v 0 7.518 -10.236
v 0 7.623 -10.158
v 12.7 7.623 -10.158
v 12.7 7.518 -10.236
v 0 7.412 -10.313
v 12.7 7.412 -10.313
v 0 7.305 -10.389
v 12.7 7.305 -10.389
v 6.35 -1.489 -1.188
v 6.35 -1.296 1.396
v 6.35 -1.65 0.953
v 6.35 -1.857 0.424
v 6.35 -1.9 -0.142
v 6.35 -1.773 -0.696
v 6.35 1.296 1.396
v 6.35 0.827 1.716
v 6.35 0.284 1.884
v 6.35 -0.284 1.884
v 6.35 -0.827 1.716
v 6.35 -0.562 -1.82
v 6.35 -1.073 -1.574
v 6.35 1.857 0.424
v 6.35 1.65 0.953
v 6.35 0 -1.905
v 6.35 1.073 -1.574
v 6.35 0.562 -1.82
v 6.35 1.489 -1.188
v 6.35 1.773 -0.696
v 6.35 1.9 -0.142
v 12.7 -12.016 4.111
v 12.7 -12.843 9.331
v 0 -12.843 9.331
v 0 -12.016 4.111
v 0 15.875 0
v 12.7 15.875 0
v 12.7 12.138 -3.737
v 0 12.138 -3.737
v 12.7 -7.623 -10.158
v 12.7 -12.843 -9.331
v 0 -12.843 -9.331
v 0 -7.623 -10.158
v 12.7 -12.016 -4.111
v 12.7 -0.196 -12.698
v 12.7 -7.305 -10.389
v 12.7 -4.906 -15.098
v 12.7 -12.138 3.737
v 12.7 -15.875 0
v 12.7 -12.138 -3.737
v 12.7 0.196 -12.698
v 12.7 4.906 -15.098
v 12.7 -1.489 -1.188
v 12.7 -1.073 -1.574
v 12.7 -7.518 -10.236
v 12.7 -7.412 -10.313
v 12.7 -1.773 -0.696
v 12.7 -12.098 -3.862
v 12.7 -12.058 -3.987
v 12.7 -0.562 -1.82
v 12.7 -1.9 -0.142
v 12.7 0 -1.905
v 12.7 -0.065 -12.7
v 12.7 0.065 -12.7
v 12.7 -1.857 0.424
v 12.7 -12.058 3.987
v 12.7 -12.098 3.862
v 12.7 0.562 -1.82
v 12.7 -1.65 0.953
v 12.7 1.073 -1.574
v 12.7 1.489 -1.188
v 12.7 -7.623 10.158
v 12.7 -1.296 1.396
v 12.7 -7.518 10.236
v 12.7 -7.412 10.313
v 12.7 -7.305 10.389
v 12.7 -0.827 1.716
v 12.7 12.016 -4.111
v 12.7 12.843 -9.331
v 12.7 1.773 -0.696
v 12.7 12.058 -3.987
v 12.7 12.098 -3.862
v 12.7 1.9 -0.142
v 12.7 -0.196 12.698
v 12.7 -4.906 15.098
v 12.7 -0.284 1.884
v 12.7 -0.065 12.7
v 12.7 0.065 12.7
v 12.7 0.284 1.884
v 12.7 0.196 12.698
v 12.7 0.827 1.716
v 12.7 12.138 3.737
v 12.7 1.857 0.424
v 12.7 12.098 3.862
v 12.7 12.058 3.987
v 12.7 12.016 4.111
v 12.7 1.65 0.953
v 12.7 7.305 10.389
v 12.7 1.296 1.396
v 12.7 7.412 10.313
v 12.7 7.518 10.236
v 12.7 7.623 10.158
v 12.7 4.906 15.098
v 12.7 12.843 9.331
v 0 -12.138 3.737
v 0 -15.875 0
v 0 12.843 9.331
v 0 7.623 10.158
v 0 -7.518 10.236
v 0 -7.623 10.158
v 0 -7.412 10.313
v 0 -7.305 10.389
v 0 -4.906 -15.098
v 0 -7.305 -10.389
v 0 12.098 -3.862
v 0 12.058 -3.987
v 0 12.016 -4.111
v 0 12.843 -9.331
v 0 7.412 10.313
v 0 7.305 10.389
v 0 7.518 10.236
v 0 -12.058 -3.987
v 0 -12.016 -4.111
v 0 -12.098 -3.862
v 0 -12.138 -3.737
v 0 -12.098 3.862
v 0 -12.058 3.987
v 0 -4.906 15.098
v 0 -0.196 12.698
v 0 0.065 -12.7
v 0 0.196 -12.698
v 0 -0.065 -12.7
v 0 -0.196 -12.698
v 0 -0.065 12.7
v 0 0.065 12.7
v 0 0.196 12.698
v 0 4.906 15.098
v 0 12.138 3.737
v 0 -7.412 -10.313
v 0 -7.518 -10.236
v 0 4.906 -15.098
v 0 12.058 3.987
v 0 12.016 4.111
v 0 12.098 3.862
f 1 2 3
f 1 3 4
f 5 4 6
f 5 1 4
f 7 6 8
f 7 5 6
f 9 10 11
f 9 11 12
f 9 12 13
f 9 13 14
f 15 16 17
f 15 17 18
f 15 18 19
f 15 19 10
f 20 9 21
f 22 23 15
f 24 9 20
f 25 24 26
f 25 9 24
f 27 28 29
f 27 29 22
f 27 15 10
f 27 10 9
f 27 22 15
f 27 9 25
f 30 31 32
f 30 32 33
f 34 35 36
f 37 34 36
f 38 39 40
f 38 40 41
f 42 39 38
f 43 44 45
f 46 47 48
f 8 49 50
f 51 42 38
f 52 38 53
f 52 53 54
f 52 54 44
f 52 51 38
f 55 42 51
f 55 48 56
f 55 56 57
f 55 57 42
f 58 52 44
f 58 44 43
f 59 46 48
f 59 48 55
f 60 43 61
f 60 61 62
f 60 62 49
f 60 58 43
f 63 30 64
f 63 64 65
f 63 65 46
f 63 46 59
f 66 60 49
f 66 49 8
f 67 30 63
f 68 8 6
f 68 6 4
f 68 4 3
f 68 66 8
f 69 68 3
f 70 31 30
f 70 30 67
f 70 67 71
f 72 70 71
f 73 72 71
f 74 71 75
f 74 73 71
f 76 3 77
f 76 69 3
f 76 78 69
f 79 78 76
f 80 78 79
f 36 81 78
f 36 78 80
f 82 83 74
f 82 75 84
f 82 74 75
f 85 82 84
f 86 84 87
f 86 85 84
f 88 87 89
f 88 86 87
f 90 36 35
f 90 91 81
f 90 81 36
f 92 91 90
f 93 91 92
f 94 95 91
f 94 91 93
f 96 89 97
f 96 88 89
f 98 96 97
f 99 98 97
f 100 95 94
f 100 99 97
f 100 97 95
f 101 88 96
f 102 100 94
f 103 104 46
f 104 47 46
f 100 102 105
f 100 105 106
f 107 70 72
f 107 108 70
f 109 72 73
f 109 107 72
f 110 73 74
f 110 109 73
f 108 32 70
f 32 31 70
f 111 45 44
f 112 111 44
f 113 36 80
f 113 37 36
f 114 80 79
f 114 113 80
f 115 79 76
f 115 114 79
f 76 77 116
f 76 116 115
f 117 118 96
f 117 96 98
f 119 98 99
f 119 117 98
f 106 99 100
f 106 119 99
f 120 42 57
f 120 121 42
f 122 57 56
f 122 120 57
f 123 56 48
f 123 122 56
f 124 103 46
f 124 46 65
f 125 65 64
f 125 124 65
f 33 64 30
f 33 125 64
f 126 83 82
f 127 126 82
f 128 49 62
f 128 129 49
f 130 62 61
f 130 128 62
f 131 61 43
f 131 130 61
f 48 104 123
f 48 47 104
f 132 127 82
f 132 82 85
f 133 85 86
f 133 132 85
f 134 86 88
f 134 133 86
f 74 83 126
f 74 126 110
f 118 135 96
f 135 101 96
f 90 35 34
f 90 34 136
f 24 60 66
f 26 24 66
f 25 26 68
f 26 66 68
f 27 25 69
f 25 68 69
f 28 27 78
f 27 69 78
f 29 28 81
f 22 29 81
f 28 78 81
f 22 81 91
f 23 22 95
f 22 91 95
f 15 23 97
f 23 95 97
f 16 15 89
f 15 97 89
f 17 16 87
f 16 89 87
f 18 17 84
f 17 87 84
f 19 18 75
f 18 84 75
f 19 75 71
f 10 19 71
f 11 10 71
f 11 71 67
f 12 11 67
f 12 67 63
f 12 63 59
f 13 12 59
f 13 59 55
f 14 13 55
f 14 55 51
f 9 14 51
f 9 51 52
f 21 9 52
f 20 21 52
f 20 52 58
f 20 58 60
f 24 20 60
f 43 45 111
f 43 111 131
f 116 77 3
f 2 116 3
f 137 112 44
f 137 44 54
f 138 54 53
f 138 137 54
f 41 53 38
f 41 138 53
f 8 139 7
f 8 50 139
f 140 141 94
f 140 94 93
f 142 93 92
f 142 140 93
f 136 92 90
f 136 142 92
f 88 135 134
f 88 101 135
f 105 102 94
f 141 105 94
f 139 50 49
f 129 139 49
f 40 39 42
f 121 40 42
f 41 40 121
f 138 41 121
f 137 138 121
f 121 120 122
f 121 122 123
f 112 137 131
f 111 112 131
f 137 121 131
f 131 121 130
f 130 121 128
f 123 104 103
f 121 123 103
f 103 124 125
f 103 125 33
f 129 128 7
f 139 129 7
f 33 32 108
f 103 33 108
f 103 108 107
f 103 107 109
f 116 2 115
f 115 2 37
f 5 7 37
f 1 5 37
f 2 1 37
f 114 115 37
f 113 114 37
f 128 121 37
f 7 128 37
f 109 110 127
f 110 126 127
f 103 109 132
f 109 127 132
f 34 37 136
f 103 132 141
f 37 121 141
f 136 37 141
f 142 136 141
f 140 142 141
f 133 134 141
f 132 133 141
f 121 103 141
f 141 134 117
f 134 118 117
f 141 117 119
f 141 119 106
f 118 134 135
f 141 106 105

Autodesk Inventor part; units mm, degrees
ref_plane "YZ Plane" through (0, 0, 0) normal (1, 0, 0) x (0, 1, 0)
ref_plane "XZ Plane" through (0, 0, 0) normal (0, 1, 0) x (-1, 0, 0)
ref_plane "XY Plane" through (0, 0, 0) normal (0, 0, 1) x (1, 0, 0)
sketch "Sketch1" plane through (0, 0, 0) normal (1, 0, 0) x (0, 1, 0)
  circle A0 centre (0, 0) radius 12.7
  arc A1 (12.1376, -3.7374) -> (12.1376, 3.7374) centre (0, 0) ccw
  dimension "d0" = 25.4
extrude "Extrusion1" add sketch "Sketch1" along normal blind 12.7
sketch "Sketch2" plane through (12.7, 0, 0) normal (1, 0, 0) x (0, 0, -1)
  circle A0 centre (0, 0) radius 12.7 construction
  line L0 (0, 12.7) -> (3.175, 12.7) construction
  line L1 (0, 12.7) -> (-3.175, 12.7) construction
  line L2 (-3.175, 12.7) -> (0, 15.875) construction
  line L3 (0, 15.875) -> (3.175, 12.7) construction
  line L4 (0, 15.875) -> (-3.7374, 12.1376)
  line L5 (0, 15.875) -> (3.7374, 12.1376)
  arc A1 (3.7374, 12.1376) -> (-3.7374, 12.1376) centre (0, 0) ccw
  line L6 (-9.3311, 12.8431) -> (-10.1579, 7.6228)
  line L7 (-9.3311, 12.8431) -> (-4.1107, 12.0163)
  arc A2 (-4.1107, 12.0163) -> (-10.1579, 7.6228) centre (0, 0) ccw
  line L8 (-15.098, 4.9056) -> (-12.6985, 0.1963)
  line L9 (-15.098, 4.9056) -> (-10.3887, 7.3052)
  arc A3 (-10.3887, 7.3052) -> (-12.6985, 0.1963) centre (0, 0) ccw
  line L10 (-15.098, -4.9056) -> (-10.3887, -7.3052)
  line L11 (-15.098, -4.9056) -> (-12.6985, -0.1963)
  arc A4 (-12.6985, -0.1963) -> (-10.3887, -7.3052) centre (0, 0) ccw
  line L12 (-9.3311, -12.8431) -> (-4.1107, -12.0163)
  line L13 (-9.3311, -12.8431) -> (-10.1579, -7.6228)
  arc A5 (-10.1579, -7.6228) -> (-4.1107, -12.0163) centre (0, 0) ccw
  line L14 (0, -15.875) -> (3.7374, -12.1376)
  line L15 (0, -15.875) -> (-3.7374, -12.1376)
  arc A6 (-3.7374, -12.1376) -> (3.7374, -12.1376) centre (0, 0) ccw
  line L16 (9.3311, -12.8431) -> (10.1579, -7.6228)
  line L17 (9.3311, -12.8431) -> (4.1107, -12.0163)
  arc A7 (4.1107, -12.0163) -> (10.1579, -7.6228) centre (0, 0) ccw
  line L18 (15.098, -4.9056) -> (12.6985, -0.1963)
  line L19 (15.098, -4.9056) -> (10.3887, -7.3052)
  arc A8 (10.3887, -7.3052) -> (12.6985, -0.1963) centre (0, 0) ccw
  line L20 (15.098, 4.9056) -> (10.3887, 7.3052)
  line L21 (15.098, 4.9056) -> (12.6985, 0.1963)
  arc A9 (12.6985, 0.1963) -> (10.3887, 7.3052) centre (0, 0) ccw
  line L22 (9.3311, 12.8431) -> (4.1107, 12.0163)
  line L23 (9.3311, 12.8431) -> (10.1579, 7.6228)
  arc A10 (10.1579, 7.6228) -> (4.1107, 12.0163) centre (0, 0) ccw
  point P0 (-7.4649, 10.2745)
  point P1 (-12.0784, 3.9245)
  point P2 (-12.0784, -3.9245)
  point P3 (-7.4649, -10.2745)
  point P4 (0, -12.7)
  point P5 (7.4649, -10.2745)
  point P6 (12.0784, -3.9245)
  point P7 (12.0784, 3.9245)
  point P8 (7.4649, 10.2745)
  dimension "d6" = 3.175
  dimension "d7" = 3.175
  dimension "d8" = 45
  dimension "d11" = 360
extrude "Extrusion2" add sketch "Sketch2" against normal blind 12.7
sketch "Sketch3" plane through (12.7, 0, 0) normal (1, 0, 0) x (0, 0, -1)
  circle A0 centre (0, 0) radius 1.905
  dimension "d15" = 3.81
extrude "Extrusion3" cut sketch "Sketch3" against normal blind 6.35
properties part number "Finger Pinion"
